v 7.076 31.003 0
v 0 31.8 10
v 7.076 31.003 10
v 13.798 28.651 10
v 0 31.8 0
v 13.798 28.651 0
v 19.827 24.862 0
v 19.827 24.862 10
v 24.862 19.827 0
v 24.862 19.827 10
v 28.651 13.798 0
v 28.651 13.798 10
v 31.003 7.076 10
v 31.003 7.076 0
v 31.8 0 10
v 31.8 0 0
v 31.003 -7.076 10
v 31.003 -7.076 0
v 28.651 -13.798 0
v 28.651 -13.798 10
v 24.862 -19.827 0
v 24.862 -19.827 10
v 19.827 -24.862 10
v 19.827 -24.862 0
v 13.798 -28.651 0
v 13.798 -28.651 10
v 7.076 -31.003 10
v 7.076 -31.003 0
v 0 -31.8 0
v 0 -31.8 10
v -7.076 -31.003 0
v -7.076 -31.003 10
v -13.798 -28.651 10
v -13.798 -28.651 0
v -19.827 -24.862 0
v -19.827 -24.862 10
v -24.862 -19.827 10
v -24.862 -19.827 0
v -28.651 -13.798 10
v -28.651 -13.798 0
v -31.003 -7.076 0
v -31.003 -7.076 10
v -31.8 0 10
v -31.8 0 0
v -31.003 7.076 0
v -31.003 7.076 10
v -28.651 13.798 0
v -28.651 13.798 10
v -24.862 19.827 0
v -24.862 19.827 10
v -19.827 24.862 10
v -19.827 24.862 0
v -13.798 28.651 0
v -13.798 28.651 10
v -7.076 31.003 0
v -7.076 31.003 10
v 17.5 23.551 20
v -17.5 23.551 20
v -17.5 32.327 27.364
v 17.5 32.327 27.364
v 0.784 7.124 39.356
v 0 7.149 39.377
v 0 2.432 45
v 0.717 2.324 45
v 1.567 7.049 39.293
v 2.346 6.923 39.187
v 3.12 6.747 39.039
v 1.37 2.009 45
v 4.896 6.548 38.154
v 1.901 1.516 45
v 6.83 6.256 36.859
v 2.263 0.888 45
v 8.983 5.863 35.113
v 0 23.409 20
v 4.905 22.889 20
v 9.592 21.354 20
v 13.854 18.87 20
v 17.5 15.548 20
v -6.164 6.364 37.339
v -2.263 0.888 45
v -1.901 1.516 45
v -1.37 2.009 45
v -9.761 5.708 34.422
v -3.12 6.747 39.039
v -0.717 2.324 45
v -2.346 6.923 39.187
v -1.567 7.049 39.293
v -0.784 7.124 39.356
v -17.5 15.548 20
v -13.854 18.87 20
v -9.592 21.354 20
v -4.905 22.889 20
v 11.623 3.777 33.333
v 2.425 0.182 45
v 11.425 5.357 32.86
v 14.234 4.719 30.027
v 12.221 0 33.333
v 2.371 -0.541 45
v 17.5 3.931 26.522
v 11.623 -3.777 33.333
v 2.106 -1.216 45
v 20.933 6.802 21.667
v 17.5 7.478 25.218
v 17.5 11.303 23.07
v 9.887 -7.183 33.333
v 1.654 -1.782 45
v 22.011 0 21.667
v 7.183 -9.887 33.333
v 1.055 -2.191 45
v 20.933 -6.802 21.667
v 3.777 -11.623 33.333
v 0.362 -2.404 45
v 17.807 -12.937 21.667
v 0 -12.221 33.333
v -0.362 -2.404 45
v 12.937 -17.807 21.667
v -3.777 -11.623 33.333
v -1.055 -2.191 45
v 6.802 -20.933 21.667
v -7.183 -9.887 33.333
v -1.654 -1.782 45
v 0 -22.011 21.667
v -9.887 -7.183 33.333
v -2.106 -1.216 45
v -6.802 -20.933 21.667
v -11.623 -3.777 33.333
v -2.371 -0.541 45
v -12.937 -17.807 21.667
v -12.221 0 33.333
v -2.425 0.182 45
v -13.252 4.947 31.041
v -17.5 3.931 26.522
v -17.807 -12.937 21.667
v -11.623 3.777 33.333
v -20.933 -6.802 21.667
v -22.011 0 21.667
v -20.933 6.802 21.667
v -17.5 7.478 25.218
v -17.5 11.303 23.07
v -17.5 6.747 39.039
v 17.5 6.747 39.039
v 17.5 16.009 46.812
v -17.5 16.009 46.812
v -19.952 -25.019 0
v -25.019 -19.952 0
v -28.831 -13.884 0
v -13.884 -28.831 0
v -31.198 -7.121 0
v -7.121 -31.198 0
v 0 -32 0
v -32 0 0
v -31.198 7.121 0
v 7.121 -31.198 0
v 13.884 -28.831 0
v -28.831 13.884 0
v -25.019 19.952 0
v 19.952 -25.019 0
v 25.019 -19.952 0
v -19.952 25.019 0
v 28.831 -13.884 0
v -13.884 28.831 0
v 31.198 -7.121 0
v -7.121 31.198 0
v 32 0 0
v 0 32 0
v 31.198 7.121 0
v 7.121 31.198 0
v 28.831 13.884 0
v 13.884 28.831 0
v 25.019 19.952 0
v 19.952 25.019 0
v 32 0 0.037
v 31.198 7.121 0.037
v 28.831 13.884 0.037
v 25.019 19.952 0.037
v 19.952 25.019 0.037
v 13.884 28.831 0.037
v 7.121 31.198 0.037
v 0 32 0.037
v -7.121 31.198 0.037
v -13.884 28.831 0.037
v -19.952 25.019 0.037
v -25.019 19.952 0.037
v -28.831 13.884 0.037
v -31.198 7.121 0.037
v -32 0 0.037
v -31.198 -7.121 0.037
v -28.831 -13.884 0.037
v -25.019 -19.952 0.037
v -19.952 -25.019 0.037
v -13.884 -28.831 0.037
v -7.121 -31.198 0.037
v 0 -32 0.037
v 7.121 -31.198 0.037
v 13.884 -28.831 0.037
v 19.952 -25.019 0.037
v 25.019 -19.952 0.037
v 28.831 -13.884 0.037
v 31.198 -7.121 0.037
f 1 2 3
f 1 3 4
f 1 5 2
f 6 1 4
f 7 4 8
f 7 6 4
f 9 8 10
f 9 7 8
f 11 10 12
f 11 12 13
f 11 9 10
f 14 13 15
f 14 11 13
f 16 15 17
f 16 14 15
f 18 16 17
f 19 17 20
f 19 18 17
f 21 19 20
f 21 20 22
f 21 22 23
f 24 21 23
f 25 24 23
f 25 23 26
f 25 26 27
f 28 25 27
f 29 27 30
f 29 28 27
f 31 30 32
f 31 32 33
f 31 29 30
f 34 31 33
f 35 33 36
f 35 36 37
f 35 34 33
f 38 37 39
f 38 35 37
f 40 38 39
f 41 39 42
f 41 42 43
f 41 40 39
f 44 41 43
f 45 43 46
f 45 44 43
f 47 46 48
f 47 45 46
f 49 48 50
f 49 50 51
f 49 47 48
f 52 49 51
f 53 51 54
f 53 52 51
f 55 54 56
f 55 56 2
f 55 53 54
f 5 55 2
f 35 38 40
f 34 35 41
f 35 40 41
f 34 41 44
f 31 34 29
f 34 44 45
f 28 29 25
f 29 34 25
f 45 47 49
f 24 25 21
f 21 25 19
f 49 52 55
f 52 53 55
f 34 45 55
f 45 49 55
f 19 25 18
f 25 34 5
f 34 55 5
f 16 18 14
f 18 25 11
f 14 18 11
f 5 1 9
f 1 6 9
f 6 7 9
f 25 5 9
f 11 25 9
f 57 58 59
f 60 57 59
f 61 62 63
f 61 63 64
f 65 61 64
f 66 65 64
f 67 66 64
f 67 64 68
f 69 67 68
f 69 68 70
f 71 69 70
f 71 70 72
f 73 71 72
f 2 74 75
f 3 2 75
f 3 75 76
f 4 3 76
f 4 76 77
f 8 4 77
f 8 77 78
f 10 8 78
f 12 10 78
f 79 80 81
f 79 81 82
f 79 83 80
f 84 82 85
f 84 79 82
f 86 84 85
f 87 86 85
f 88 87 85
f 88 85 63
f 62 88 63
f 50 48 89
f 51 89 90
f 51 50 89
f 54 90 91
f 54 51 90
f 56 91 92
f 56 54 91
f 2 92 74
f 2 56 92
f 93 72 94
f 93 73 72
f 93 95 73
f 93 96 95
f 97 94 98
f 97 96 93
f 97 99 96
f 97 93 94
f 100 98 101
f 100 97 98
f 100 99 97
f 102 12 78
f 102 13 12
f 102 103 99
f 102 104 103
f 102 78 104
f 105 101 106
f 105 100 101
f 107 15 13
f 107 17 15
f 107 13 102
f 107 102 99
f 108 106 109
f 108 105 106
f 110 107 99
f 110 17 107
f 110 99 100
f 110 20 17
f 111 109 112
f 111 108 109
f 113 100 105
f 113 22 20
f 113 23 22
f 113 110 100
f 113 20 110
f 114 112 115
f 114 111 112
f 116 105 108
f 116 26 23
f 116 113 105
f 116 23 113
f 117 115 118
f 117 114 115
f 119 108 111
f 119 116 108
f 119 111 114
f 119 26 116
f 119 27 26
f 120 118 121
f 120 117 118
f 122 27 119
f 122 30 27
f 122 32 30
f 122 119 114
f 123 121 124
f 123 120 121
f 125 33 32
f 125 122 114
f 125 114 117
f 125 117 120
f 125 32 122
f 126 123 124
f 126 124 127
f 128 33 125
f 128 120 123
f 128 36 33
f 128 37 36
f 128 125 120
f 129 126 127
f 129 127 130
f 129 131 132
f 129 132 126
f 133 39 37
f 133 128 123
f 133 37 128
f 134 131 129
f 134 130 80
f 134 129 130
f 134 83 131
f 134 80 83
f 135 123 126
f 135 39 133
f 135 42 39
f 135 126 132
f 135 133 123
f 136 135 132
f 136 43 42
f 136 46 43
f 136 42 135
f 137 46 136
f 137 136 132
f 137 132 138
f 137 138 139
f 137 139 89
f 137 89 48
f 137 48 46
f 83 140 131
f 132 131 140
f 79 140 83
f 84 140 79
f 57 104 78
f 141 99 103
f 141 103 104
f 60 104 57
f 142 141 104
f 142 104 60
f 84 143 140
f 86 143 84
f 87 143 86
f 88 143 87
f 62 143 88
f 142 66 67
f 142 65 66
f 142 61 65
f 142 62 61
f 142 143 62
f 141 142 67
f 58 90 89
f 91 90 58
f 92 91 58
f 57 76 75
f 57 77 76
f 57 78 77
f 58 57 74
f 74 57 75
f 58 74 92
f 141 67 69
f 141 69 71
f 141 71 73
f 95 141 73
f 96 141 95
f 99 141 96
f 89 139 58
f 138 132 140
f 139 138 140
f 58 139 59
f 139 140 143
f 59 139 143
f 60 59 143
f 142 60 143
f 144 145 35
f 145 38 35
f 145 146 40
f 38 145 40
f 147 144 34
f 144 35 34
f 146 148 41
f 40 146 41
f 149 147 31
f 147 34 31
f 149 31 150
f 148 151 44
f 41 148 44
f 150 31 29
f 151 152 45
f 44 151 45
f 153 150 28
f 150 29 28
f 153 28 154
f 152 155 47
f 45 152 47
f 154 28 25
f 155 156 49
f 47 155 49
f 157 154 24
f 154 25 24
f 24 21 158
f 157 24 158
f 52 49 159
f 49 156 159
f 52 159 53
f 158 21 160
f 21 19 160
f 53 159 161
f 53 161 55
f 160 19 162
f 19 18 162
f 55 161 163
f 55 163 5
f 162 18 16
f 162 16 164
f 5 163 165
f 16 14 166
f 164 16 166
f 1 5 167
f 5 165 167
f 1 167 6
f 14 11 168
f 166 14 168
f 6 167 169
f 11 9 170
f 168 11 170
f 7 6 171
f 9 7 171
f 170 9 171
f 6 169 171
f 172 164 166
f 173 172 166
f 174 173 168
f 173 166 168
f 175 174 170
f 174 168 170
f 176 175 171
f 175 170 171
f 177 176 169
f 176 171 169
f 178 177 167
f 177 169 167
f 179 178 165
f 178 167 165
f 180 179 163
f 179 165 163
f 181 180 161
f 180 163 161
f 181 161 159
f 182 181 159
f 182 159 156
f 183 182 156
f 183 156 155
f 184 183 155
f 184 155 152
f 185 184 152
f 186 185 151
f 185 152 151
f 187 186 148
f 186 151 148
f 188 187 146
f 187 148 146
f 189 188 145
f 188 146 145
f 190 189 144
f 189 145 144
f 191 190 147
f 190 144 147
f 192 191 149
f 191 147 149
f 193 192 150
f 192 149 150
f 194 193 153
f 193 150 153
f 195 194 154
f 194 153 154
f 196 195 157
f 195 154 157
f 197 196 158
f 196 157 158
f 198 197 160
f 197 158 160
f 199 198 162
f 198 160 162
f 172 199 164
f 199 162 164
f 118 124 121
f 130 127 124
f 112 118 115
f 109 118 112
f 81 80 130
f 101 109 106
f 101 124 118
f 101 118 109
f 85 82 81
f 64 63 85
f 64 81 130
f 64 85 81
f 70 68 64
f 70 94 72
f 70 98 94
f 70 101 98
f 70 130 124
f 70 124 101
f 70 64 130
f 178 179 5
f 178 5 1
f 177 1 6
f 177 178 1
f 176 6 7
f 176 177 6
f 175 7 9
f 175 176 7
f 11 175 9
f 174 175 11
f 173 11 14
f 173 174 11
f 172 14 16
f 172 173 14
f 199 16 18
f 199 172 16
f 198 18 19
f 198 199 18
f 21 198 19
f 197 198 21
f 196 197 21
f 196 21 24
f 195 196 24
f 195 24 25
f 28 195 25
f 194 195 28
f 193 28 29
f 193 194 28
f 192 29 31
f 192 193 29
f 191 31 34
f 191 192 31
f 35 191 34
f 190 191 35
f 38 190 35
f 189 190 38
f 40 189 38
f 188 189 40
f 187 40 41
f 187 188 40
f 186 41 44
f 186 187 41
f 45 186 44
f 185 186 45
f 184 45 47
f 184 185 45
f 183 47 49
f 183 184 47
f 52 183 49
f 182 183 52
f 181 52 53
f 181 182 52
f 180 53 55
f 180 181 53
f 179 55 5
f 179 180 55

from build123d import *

# Parameters (mm, degrees)
F0_R      = 32
F1_DEPTH  = 10
F1_FACE_R = 32
F2_DEPTH  = 35
F6_DEPTH  = 17.5


with BuildPart() as f1:
    # F0 (on Top) → F1 (new body)
    with BuildSketch(Plane.XY):
        Circle(F0_R)
    extrude(amount=F1_DEPTH)

    # F1_face (on face) → F2 (join)
    with BuildSketch(Plane.XY.offset(10)):
        Circle(F1_FACE_R)
    extrude(amount=F2_DEPTH)

    # F3 (on Right) → F4 (revolve, cut)
    with BuildSketch(Plane.YZ):
        Polygon((35.553046, 47.536178), (0.303472, 47.536178), (31.800065, 10), (31.800065, 0), (39.023295, 1.339023), (40.083904, 13.93372), align=None)
    revolve(axis=Axis((0, 0, 24.252612), (0, 0, -1)), mode=Mode.SUBTRACT)

    # F5 (on Right) → F6 (join, symmetric)
    with BuildSketch(Plane.YZ):
        Polygon((32.32736, 27.364184), (16.009078, 46.811556), (6.746613, 39.039424), (2.463955, 20), (23.551067, 20), align=None)
    extrude(amount=F6_DEPTH, both=True)


solid = f1.part
